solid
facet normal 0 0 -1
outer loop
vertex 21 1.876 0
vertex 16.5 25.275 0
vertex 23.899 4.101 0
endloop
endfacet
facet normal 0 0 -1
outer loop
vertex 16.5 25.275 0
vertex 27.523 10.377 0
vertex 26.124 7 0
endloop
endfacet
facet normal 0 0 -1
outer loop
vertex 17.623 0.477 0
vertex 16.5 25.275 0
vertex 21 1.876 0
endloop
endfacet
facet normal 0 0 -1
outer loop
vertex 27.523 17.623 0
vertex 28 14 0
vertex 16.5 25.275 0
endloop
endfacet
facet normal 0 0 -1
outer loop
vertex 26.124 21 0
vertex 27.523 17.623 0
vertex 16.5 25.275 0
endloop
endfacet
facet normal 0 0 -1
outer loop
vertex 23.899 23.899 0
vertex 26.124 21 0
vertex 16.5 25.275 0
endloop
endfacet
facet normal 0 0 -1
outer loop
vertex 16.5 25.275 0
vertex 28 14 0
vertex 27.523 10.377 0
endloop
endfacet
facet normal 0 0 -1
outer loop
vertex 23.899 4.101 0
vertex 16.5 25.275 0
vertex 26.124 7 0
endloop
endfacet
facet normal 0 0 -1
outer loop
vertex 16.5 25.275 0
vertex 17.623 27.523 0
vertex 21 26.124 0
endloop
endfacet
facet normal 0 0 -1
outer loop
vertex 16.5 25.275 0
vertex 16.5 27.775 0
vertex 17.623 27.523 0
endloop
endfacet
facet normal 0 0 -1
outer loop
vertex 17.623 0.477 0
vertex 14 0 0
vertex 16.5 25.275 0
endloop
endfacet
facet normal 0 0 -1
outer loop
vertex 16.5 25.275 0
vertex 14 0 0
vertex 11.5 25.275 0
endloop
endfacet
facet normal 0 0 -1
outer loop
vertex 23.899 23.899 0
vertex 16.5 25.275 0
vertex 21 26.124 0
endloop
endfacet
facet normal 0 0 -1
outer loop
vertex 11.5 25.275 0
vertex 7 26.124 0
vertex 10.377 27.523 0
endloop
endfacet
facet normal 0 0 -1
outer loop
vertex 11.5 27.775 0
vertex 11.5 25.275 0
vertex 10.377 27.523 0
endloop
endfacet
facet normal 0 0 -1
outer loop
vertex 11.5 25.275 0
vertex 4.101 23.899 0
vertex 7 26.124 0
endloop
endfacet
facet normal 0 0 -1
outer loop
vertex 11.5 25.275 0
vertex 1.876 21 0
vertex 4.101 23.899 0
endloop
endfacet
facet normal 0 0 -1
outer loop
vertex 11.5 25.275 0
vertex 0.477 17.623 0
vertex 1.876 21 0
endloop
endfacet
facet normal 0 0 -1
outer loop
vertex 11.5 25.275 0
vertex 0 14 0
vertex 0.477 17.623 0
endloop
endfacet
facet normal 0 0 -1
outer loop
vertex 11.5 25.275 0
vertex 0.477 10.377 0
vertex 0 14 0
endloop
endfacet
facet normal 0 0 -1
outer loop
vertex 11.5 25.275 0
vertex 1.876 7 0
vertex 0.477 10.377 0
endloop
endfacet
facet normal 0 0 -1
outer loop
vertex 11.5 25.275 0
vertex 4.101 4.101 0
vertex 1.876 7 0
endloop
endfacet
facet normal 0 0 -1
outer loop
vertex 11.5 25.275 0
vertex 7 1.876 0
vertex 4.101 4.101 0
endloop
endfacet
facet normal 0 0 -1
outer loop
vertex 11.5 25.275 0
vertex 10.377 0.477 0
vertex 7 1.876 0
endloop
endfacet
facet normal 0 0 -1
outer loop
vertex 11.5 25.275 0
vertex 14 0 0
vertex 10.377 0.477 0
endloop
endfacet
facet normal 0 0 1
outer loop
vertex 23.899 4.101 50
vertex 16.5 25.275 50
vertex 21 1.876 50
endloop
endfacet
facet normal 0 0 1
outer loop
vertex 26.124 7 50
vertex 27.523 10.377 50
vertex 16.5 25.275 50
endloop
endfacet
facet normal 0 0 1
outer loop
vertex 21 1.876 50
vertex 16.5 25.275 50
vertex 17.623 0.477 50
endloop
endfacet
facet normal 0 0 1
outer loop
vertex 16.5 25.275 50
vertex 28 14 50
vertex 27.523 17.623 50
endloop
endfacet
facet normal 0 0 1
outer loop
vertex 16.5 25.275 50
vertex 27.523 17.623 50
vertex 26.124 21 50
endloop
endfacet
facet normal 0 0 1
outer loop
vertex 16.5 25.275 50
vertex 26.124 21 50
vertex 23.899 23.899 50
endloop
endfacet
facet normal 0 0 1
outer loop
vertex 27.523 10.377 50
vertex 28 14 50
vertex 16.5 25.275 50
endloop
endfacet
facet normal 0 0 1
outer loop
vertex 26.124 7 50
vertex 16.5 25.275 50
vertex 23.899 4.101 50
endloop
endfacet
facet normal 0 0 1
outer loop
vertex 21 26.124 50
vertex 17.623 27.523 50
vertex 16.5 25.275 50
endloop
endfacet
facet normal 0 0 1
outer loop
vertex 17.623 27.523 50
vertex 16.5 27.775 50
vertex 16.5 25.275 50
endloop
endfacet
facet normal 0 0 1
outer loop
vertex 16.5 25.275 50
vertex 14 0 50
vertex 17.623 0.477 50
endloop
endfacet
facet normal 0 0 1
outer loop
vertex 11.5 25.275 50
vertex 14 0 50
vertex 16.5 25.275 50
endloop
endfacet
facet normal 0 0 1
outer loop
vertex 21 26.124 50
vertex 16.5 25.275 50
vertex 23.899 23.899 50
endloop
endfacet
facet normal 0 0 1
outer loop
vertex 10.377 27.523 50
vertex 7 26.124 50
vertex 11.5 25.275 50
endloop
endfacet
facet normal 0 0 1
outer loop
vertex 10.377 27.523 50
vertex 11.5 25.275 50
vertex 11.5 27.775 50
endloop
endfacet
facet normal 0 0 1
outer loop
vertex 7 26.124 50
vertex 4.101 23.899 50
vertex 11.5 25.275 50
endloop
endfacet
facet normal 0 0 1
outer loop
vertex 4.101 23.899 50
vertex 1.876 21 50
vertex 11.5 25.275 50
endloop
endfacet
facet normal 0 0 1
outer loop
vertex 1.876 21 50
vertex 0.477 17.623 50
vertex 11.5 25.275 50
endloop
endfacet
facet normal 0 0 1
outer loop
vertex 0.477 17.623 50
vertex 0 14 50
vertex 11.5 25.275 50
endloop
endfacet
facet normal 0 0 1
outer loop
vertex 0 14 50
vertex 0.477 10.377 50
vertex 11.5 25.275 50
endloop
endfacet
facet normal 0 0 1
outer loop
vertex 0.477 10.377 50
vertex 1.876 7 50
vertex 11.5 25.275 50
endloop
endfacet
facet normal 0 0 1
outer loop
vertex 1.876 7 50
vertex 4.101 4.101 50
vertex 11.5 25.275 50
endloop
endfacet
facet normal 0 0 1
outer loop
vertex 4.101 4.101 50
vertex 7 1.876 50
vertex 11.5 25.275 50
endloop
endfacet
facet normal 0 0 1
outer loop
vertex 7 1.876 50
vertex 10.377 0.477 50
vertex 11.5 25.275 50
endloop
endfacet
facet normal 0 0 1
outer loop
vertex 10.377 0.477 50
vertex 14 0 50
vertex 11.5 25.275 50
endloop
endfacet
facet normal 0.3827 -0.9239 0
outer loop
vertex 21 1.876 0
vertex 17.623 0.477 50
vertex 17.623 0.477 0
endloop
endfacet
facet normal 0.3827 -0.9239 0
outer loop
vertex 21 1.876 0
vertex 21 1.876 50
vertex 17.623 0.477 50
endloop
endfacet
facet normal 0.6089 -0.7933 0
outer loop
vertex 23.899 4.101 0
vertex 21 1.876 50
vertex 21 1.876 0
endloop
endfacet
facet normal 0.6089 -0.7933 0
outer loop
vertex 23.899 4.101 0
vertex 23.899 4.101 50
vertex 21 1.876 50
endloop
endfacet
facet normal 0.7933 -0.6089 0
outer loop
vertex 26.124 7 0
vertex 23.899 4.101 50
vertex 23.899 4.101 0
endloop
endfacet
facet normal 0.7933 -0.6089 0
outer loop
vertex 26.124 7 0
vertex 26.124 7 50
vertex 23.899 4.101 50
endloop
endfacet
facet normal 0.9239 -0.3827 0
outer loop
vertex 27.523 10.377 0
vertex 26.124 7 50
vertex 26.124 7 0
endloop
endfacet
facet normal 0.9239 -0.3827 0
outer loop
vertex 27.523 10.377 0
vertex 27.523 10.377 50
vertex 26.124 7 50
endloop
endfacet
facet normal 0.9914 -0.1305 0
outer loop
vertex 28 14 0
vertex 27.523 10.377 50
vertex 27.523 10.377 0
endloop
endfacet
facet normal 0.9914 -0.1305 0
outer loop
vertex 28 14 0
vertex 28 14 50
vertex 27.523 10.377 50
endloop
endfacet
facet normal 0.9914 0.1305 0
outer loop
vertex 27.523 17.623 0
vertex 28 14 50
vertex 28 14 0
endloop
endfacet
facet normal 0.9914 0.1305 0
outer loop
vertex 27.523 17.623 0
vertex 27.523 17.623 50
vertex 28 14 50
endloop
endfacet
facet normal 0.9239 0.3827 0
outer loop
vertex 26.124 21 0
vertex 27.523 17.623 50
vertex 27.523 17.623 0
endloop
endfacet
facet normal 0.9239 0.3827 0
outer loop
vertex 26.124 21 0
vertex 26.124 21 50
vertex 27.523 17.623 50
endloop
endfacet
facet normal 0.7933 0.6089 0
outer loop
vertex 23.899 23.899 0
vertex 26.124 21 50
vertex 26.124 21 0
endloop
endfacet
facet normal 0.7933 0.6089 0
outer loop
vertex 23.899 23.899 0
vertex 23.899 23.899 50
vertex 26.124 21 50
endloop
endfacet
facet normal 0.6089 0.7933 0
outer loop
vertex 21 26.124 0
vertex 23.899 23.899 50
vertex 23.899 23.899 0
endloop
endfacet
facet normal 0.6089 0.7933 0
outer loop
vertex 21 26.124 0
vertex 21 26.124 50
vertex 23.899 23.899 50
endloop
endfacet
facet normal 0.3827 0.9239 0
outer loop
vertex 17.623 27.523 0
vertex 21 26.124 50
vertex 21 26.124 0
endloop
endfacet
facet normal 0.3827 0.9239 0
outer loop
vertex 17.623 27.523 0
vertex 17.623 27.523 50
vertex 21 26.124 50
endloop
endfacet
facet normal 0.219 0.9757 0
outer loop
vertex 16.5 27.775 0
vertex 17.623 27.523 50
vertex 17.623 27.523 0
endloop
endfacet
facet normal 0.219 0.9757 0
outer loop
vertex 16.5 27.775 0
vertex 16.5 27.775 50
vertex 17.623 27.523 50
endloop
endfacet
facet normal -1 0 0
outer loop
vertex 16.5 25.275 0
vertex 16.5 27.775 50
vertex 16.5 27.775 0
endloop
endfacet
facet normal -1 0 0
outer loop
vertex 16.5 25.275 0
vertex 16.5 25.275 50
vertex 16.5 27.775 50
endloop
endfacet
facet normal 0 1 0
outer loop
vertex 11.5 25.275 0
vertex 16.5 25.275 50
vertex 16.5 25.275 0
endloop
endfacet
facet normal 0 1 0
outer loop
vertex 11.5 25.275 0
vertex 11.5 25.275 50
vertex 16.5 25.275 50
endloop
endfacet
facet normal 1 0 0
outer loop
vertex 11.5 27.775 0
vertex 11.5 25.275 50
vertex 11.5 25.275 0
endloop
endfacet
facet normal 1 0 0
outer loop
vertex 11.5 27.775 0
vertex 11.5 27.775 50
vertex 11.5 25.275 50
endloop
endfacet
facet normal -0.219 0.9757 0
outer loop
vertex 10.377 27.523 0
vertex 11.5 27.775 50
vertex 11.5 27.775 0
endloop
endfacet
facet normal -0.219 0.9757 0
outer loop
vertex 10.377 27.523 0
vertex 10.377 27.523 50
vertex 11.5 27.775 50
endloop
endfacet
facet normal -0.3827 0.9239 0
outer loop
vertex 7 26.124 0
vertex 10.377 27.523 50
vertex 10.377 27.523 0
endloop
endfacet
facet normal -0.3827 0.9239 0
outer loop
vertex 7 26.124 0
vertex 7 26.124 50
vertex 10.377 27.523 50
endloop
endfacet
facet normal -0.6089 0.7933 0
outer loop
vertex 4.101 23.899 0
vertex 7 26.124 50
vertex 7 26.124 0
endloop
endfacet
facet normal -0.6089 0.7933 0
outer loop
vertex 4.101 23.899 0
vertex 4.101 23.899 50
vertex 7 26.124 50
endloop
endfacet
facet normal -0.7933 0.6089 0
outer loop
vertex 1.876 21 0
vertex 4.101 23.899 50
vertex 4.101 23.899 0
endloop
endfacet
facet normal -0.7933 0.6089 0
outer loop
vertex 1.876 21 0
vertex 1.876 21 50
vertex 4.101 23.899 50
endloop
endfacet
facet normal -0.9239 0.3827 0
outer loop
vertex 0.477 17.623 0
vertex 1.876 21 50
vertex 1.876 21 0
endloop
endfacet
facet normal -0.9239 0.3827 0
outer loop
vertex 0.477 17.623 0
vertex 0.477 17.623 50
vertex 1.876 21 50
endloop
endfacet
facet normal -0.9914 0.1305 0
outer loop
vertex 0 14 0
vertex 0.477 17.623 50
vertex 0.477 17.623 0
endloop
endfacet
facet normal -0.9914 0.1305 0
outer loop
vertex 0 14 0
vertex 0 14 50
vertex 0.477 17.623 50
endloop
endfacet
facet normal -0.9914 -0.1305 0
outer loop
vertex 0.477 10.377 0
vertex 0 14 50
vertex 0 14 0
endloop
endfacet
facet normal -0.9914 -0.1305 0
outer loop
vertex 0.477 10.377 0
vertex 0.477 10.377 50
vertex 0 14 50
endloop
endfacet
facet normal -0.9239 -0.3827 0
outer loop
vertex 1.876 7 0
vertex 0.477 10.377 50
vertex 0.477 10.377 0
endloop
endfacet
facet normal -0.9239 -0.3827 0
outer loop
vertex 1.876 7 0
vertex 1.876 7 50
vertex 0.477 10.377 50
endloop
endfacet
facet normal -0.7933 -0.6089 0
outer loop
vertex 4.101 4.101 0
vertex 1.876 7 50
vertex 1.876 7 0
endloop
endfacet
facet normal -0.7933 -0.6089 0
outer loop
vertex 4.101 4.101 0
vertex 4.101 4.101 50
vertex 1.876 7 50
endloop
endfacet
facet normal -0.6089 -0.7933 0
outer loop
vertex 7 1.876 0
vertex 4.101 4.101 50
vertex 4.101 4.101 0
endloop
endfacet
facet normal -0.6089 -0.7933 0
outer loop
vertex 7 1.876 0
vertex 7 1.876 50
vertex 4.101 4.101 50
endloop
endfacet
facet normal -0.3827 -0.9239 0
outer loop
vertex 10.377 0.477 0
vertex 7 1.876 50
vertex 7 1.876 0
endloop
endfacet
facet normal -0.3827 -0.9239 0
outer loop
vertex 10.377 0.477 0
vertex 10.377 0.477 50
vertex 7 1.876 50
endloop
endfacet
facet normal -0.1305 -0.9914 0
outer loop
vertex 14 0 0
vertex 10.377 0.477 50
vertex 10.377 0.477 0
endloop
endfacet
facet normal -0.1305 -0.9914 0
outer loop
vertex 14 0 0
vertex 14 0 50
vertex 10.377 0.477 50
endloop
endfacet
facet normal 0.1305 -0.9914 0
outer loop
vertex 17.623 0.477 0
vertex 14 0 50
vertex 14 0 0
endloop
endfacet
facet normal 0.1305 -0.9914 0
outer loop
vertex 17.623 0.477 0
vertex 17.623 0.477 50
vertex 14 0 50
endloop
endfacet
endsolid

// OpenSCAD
$fn = 32;

// ----------------------------------------------------------------------
// Keyway shaft: d28 shaft, key 5 x 2.5 mm
// ----------------------------------------------------------------------

// --- parameters (mm) ---
shaft_r = 14;             // shaft radius
key_w = 5;                // keyway width
key_d = 2.5;              // keyway depth below the surface line
plate_t = 50;             // shaft length, Z (extrusion height)
fit_tol = 0.05;           // declared fit tolerance (prompt contract)
free_tol = 0.3;           // declared free tolerance (prompt contract)

shaft_d = 2 * shaft_r;  // shaft diameter
circle_step = 15;  // polygon sampling step, degrees

profile = [[10.377, 27.523], [7, 26.124], [4.101, 23.899], [1.876, 21], [0.477, 17.623], [0, 14], [0.477, 10.377], [1.876, 7], [4.101, 4.101], [7, 1.876], [10.377, 0.477], [14, 0], [17.623, 0.477], [21, 1.876], [23.899, 4.101], [26.124, 7], [27.523, 10.377], [28, 14], [27.523, 17.623], [26.124, 21], [23.899, 23.899], [21, 26.124], [17.623, 27.523], [16.5, 27.775], [16.5, 25.275], [11.5, 25.275], [11.5, 27.775]];  // primary outline, 27 points, counter clockwise

// --- the one profile operation ---
linear_extrude(height = plate_t) polygon(points = profile);
